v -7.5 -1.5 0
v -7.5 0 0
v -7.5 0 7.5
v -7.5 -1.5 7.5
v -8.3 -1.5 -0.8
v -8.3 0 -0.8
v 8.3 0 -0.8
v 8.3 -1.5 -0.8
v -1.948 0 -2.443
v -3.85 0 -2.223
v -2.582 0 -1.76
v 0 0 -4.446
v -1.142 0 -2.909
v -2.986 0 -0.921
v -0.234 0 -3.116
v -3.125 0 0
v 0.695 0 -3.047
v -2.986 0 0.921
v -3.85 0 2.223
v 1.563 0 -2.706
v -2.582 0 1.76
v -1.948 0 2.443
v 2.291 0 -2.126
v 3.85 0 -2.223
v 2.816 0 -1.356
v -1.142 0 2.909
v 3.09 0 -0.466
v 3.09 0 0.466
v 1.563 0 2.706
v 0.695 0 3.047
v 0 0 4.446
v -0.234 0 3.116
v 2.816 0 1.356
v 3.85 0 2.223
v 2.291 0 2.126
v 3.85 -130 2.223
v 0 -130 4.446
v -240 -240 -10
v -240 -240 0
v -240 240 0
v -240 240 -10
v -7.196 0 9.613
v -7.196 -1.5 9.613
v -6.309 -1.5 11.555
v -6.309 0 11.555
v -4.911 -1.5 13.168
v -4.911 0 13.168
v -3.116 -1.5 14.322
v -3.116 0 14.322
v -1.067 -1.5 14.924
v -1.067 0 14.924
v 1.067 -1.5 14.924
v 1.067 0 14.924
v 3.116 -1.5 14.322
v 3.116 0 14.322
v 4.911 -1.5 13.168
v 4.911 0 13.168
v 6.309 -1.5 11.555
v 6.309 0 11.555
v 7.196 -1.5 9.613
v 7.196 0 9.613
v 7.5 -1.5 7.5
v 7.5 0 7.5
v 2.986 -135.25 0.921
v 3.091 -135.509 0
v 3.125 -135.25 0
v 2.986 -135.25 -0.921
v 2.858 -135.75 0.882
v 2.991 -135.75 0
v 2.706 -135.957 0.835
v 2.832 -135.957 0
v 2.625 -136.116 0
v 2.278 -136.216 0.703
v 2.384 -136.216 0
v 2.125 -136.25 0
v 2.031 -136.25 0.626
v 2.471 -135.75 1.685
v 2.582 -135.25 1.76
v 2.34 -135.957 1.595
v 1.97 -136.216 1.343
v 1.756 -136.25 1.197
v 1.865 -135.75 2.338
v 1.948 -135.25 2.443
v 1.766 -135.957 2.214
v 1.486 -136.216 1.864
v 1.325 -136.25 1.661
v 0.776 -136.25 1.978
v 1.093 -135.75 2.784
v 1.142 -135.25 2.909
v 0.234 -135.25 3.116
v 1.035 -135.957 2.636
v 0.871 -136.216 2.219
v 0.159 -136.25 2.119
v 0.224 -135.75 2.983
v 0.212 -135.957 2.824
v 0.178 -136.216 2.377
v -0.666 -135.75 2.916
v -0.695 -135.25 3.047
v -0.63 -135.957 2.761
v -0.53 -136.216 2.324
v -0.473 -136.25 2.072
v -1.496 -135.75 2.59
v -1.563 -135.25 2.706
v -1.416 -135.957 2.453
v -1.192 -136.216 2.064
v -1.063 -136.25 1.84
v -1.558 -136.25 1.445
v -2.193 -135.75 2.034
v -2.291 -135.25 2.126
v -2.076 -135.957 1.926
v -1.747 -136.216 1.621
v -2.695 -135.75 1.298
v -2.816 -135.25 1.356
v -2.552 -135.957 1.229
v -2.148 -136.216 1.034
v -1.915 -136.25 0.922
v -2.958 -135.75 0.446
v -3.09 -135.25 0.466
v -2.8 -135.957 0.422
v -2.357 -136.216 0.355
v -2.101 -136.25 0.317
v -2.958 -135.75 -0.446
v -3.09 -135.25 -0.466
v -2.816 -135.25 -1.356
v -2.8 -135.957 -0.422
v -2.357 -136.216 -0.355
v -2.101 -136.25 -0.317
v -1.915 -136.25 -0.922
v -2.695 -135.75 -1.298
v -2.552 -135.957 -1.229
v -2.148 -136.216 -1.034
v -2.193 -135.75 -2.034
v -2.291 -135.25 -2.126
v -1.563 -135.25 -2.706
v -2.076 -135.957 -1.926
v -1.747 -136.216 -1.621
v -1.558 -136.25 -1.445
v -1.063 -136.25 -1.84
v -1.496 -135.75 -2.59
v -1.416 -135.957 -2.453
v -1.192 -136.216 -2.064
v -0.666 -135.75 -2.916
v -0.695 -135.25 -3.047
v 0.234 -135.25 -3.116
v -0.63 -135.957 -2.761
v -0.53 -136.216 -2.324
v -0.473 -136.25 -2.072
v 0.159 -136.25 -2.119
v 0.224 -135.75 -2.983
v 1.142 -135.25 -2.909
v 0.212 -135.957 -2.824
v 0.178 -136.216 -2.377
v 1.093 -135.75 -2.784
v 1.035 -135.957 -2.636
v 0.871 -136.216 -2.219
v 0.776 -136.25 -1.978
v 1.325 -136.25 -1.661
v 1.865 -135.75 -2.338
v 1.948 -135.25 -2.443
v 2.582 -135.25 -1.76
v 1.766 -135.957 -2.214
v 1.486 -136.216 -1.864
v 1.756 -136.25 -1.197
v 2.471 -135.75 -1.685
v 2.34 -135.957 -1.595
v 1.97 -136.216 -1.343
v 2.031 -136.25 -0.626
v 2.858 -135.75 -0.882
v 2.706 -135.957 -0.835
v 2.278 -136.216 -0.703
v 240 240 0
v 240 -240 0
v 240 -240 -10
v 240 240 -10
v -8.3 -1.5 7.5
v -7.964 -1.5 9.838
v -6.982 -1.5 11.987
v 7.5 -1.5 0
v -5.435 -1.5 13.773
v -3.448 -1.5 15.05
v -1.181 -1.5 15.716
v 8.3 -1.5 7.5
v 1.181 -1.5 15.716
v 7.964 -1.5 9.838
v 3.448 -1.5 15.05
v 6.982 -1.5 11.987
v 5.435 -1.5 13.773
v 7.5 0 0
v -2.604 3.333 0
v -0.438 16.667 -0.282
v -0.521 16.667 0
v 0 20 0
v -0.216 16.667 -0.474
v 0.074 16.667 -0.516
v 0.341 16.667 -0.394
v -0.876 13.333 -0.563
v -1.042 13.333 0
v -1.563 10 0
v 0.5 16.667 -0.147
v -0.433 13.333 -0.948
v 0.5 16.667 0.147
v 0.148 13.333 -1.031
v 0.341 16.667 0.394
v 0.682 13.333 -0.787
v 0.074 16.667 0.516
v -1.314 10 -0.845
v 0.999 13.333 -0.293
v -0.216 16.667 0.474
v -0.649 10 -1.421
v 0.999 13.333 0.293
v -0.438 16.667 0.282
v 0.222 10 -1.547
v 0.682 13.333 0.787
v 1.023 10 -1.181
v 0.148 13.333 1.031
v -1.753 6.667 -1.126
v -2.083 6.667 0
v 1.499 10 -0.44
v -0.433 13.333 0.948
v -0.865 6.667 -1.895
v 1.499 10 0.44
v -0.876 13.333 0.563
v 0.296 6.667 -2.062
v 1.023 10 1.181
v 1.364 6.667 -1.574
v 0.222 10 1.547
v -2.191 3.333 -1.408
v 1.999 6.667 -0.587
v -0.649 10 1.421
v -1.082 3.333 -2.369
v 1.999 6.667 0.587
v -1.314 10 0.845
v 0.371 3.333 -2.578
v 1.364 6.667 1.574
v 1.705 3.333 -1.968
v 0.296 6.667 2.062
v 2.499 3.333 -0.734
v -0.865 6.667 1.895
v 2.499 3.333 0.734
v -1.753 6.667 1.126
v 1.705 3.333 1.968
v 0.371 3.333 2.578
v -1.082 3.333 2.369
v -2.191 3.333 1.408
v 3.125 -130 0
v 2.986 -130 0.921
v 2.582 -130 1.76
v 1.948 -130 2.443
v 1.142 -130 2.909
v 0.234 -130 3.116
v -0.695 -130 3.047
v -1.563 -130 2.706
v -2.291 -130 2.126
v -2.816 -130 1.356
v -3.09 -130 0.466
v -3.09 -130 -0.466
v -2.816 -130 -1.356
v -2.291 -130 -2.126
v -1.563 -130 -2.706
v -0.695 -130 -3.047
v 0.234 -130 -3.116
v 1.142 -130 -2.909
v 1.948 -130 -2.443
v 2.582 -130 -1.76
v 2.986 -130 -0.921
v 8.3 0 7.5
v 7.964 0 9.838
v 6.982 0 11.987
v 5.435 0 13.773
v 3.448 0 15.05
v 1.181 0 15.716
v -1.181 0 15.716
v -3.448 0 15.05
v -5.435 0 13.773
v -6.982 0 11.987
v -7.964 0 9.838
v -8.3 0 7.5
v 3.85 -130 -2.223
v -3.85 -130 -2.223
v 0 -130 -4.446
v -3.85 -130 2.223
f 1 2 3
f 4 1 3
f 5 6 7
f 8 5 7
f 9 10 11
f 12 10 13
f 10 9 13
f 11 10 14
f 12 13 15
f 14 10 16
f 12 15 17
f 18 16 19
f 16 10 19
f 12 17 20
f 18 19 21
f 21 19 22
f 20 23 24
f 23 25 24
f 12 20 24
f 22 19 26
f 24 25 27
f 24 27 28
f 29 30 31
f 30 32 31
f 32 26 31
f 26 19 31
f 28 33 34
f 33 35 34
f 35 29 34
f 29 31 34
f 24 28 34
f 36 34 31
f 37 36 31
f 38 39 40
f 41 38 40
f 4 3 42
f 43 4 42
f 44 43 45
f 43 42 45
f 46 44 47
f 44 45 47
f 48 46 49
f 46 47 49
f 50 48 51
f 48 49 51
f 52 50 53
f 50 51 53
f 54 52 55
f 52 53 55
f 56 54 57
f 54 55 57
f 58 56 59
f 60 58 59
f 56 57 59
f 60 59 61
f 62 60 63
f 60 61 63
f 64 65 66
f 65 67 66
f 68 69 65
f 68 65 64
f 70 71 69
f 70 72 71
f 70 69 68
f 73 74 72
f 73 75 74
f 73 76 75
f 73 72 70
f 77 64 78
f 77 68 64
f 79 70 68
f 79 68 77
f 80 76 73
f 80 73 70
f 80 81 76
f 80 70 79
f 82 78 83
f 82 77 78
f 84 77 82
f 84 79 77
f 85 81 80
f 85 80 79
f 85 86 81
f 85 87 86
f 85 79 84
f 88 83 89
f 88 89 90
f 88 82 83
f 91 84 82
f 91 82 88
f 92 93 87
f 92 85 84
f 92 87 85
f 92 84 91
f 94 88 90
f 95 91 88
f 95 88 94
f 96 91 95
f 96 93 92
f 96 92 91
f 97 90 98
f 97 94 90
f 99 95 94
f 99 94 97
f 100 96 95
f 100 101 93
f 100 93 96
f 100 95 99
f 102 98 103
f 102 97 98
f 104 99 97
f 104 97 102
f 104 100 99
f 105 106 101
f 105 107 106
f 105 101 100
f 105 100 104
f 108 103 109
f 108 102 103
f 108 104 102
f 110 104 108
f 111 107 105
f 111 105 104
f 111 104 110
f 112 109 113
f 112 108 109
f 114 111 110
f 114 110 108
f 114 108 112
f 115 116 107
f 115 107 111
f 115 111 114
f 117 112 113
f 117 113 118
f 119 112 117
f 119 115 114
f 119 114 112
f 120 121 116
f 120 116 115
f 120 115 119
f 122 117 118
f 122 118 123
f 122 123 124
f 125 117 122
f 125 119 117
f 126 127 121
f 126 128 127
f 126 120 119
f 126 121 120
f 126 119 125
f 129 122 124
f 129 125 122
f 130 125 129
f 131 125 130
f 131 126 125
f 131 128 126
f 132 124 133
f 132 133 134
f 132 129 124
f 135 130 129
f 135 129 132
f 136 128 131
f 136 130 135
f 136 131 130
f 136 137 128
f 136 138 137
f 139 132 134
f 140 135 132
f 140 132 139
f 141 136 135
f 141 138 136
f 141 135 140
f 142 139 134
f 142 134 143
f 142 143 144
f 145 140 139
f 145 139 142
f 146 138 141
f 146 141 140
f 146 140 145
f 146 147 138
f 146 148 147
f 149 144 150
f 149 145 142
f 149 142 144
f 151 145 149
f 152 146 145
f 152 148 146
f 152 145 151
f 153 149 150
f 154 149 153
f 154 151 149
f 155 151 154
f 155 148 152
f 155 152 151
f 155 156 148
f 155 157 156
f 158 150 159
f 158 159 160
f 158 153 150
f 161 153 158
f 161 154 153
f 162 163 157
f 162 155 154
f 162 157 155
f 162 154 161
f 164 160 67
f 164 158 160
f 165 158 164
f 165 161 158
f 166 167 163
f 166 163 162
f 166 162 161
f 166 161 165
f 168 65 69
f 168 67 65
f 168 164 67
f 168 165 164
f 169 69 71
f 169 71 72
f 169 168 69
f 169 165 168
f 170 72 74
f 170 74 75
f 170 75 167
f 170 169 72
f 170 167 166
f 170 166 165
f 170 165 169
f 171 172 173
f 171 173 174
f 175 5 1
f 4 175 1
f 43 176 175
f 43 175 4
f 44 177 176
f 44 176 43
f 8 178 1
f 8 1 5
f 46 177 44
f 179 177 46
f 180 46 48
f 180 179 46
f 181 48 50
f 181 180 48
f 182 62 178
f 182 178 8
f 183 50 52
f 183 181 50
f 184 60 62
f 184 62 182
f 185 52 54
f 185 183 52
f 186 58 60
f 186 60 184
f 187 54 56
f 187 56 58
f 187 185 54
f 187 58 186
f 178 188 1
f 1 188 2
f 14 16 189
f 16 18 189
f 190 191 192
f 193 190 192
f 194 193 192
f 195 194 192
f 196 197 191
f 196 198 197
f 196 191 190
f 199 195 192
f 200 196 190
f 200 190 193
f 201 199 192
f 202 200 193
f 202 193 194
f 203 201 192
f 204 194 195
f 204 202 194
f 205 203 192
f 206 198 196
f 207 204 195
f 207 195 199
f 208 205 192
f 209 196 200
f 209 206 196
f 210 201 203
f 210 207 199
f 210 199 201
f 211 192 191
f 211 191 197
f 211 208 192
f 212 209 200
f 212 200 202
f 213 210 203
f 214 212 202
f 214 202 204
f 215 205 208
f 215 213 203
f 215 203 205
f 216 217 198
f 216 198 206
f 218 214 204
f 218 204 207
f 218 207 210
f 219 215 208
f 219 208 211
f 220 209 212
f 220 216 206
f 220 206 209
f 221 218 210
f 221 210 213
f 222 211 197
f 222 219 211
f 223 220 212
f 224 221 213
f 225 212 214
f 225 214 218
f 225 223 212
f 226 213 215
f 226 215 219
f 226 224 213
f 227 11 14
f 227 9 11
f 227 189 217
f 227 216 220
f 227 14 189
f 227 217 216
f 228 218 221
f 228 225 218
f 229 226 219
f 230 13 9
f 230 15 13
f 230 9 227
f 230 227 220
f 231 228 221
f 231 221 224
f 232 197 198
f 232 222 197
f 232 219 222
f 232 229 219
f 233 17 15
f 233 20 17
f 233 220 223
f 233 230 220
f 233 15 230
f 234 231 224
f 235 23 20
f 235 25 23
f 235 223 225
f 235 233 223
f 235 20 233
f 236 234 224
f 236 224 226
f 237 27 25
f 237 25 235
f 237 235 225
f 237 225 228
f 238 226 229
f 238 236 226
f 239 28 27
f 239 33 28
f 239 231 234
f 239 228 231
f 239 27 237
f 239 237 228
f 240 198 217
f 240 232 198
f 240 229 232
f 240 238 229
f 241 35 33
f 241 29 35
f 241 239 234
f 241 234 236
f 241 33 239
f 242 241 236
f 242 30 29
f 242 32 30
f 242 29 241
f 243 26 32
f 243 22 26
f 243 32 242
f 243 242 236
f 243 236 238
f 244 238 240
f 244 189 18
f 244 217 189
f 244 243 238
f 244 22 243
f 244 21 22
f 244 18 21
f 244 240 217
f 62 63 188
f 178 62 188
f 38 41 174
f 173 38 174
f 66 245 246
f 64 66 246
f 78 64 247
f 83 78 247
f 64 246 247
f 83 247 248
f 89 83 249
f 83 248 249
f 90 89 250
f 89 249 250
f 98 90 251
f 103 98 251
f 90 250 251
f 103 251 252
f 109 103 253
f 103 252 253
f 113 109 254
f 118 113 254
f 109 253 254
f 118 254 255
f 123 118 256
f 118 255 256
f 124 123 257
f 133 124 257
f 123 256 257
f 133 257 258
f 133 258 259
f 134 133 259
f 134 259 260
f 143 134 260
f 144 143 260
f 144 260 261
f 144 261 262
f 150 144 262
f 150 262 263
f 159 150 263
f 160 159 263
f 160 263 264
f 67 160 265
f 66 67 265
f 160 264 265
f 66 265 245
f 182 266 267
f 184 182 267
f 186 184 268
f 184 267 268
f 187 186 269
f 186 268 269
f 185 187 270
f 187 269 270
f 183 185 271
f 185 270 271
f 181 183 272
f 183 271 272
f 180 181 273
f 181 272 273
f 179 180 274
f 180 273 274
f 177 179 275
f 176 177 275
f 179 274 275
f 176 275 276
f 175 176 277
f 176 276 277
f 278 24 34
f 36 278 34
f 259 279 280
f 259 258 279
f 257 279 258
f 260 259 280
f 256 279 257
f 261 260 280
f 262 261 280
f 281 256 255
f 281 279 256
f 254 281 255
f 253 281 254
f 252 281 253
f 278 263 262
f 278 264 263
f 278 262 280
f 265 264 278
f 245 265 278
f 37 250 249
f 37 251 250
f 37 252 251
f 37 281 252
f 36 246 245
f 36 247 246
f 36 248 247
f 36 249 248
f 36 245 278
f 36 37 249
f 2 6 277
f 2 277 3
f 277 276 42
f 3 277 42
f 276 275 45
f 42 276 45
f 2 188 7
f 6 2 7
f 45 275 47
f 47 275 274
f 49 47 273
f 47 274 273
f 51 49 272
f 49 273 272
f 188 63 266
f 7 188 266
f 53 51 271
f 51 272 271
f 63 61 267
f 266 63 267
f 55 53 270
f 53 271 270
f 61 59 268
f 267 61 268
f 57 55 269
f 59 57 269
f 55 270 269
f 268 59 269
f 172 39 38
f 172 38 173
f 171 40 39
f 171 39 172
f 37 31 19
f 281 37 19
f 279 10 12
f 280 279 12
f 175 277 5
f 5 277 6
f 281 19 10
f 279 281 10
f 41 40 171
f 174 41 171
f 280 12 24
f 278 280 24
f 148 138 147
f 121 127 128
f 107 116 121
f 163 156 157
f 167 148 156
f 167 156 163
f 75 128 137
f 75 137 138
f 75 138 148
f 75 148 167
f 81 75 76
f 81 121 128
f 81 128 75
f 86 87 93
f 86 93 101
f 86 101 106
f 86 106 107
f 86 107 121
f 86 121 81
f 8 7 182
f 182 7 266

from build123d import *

# Parameters (mm, degrees)
F1_DEPTH = 1.5
F2_W     = 480
F2_H     = 480
F3_DEPTH = 10
F5_DEPTH = 130
F6_R     = 3.125
F7_DEPTH = 6.25
F8_R     = 1


with BuildPart() as f1:
    # F0 (on Front) → F1 (new body)
    with BuildSketch(Plane.XZ):
        with BuildLine():
            ThreePointArc((8.3, 7.5), (0, 15.8), (-8.3, 7.5))
            Line((-8.3, 7.5), (-8.3, -0.8))
            Line((-8.3, -0.8), (8.3, -0.8))
            Line((8.3, -0.8), (8.3, 7.5))
        make_face()
        with BuildLine():
            Line((7.5, 0), (-7.5, 0))
            Line((-7.5, 0), (-7.5, 7.5))
            ThreePointArc((-7.5, 7.5), (0, 15), (7.5, 7.5))
            Line((7.5, 7.5), (7.5, 0))
        make_face(mode=Mode.SUBTRACT)
    extrude(amount=F1_DEPTH)


with BuildPart() as f3:
    # F2 (on Top) → F3 (new body)
    with BuildSketch(Plane.XY):
        Rectangle(F2_W, F2_H)
    extrude(amount=-F3_DEPTH)


with BuildPart() as f5:
    # F4 (on Front) → F5 (new body)
    with BuildSketch(Plane.XZ):
        Polygon((3.85, -2.2227985364), (3.85, 2.2227985364), (0, 4.4455970728), (-3.85, 2.2227985364), (-3.85, -2.2227985364), (0, -4.4455970728), align=None)
    extrude(amount=F5_DEPTH)

    # F6 (on face) → F7 (join)
    with BuildSketch(Plane.XZ.offset(130)):
        Circle(F6_R)
    extrude(amount=F7_DEPTH)

    # F8
    f8_edges = [f5.edges().sort_by_distance(p)[0] for p in [
        (-3.125, -136.25, 0),
    ]]
    fillet(f8_edges, radius=F8_R)

    # F9 (on Top) → F10 (revolve)
    with BuildSketch(Plane.XY):
        Polygon((-3.125, 0), (0, 0), (0, 20), align=None)
    revolve(axis=Axis((0, 10, 0), (0, -1, 0)))


solid = Compound([f1.part, f3.part, f5.part])
